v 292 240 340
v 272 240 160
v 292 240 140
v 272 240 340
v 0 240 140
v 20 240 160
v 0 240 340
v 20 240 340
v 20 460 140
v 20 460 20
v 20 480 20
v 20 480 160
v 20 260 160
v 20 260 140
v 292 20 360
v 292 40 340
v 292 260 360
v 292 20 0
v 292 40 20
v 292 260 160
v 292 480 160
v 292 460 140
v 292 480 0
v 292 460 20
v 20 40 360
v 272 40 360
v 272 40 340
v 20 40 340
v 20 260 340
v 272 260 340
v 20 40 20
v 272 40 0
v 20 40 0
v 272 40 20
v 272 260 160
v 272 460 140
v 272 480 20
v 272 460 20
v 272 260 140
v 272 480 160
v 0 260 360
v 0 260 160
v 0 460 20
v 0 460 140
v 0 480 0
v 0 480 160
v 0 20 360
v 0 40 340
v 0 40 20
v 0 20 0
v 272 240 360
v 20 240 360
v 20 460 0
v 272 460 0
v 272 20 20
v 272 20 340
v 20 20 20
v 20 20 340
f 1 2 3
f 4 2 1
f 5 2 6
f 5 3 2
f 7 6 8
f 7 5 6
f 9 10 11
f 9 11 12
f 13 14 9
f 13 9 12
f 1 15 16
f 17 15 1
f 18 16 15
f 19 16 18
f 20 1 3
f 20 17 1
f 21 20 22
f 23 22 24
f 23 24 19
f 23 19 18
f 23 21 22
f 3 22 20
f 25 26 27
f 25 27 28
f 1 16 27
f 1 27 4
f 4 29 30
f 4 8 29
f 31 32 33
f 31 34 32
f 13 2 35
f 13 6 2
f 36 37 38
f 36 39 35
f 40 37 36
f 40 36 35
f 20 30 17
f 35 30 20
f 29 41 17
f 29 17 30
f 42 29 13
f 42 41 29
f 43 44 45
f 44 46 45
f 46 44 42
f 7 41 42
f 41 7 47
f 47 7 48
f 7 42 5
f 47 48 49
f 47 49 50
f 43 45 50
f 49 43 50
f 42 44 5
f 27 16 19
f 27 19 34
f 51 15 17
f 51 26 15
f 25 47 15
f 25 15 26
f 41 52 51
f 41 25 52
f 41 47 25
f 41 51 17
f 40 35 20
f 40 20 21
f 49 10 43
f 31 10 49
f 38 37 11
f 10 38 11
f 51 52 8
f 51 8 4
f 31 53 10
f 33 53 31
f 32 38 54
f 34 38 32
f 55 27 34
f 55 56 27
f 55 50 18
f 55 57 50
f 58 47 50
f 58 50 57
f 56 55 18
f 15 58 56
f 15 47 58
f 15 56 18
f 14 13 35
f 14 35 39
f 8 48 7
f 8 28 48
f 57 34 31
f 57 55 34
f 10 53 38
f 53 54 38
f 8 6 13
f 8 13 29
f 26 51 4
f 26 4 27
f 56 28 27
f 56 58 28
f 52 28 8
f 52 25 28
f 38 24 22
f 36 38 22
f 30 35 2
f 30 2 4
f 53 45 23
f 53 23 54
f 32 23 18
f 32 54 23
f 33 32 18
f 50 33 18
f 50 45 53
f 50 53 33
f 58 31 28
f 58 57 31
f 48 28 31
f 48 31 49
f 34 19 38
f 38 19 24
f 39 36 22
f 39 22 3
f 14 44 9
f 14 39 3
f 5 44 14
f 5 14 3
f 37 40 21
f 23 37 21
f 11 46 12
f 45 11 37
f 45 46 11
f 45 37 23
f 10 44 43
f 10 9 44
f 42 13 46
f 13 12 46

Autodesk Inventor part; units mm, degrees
ref_plane "YZ Plane" through (0, 0, 0) normal (1, 0, 0) x (0, 1, 0)
ref_plane "XZ Plane" through (0, 0, 0) normal (0, 1, 0) x (-1, 0, 0)
ref_plane "XY Plane" through (0, 0, 0) normal (0, 0, 1) x (1, 0, 0)
sketch "Sketch1" plane through (0, 0, 0) normal (0, 0, 1) x (1, 0, 0)
  line L0 (0, 0) -> (220, 0)
  line L1 (220, 0) -> (220, 480)
  line L2 (220, 480) -> (0, 480)
  line L3 (0, 480) -> (0, 0)
  dimension "d0" = 480
  dimension "d1" = 220
extrude "Extrusion1" add sketch "Sketch1" along normal blind 360
sketch "Sketch2" plane through (0, 480, 0) normal (0, 1, 0) x (1, 0, 0)
  line L0 (220, 0) -> (220, -360) projected
  line L1 (0, 0) -> (220, 0)
  line L2 (220, 0) -> (220, -160)
  line L3 (220, -160) -> (0, -160)
  line L4 (0, -160) -> (0, 0)
  line L5 (20, -20) -> (200, -20)
  line L6 (200, -20) -> (200, -140)
  line L7 (200, -140) -> (20, -140)
  line L8 (20, -140) -> (20, -20)
  line L9 (0, -360) -> (220, -360) projected
  line L10 (0, -160) -> (220, -160)
  line L11 (220, -160) -> (220, -360)
  line L12 (220, -360) -> (0, -360)
  line L13 (0, -360) -> (0, -160)
  dimension "d4" = 160
  dimension "d5" = 20
  dimension "d6" = 20
  dimension "d7" = 20
  dimension "d8" = 20
extrude "Extrusion2" cut sketch "Sketch2" against normal blind 220 contours L0 L9 L13 L3
sketch "Sketch3" plane through (220, 0, 0) normal (1, 0, 0) x (0, 0, -1)
  line L0 (-20, 240) -> (-20, 20)
  line L1 (-20, 20) -> (-340, 20)
  line L2 (-340, 20) -> (-340, 240)
  line L3 (-160, 260) -> (-360, 260) projected
  line L4 (-360, 0) -> (-360, 260) projected
  line L5 (0, 0) -> (-360, 0) projected
  line L6 (0, 0) -> (0, 480) projected
  line L7 (-340, 240) -> (-140, 240)
  line L8 (-140, 240) -> (-140, 460)
  line L9 (-140, 460) -> (-20, 460)
  line L10 (-20, 460) -> (-20, 240)
  line L11 (-160, 480) -> (-160, 260) projected
  line L12 (0, 480) -> (-160, 480) projected
  dimension "d12" = 20
  dimension "d13" = 20
  dimension "d14" = 20
  dimension "d16" = 20
  dimension "d17" = 20
  dimension "d18" = 20
extrude "Extrusion3" cut sketch "Sketch3" against normal blind 220 contours L0 L1 L2 L7 L8 L9 L10
sketch "Sketch4" plane through (0, 0, 360) normal (0, 0, 1) x (1, 0, 0)
  line L0 (20, 240) -> (200, 240)
  line L1 (200, 240) -> (200, 20)
  line L2 (200, 20) -> (20, 20)
  line L3 (20, 20) -> (20, 240)
  line L4 (220, 260) -> (0, 260) projected
  line L5 (0, 260) -> (0, 0) projected
  line L6 (0, 0) -> (220, 0) projected
  line L7 (220, 0) -> (220, 260) projected
  dimension "d21" = 20
  dimension "d22" = 20
  dimension "d23" = 20
  dimension "d24" = 20
extrude "Extrusion4" cut sketch "Sketch4" against normal blind 600 contours L0 L1 L2 L3
sketch "Sketch5" plane through (0, 0, 0) normal (0, -1, 0) x (1, 0, 0)
  line L0 (200, 20) -> (200, 0) projected
  line L1 (20, 340) -> (200, 340)
  line L2 (200, 340) -> (200, 20)
  line L3 (200, 20) -> (20, 20)
  line L4 (20, 20) -> (20, 340)
  point P0 (0, 0)
extrude "Extrusion5" cut sketch "Sketch5" against normal blind 900
sketch "Sketch6" plane through (0, 0, 0) normal (0, 0, -1) x (-1, 0, 0)
  line L0 (-220, 240) -> (-200, 240) projected
  line L1 (-20, 460) -> (-20, 240) projected
  line L2 (-200, 240) -> (-20, 240)
  line L3 (-20, 240) -> (-20, 460)
  line L4 (-20, 460) -> (-200, 460)
  line L5 (-200, 460) -> (-200, 240)
  point P0 (0, 0)
extrude "Extrusion6" cut sketch "Sketch6" against normal blind 80
sketch "Sketch7" plane through (20, 260, 160) normal (1, 0, 0) x (0, 0, -1)
  line L0 (20, 200) -> (20, -20) projected
  line L1 (20, -20) -> (0, -20)
  line L2 (0, -20) -> (0, 0)
  line L3 (0, 0) -> (20, 0)
  line L4 (20, 0) -> (20, -20)
  point P0 (160, -260)
extrude "Extrusion7" add sketch "Sketch7" along normal blind 180
sketch "Sketch8" plane through (0, 0, 0) normal (0, -1, 0) x (1, 0, 0)
  point P0 (0, 0)
sketch "Sketch9" plane through (220, 0, 0) normal (1, 0, 0) x (0, 0, -1)
  line L0 (-360, 0) -> (-360, 260) projected
  line L1 (-360, 0) -> (-360, 260)
  line L2 (-360, 260) -> (-160, 260)
  line L3 (-160, 480) -> (-20, 480) projected
  line L4 (-160, 260) -> (-160, 480)
  line L5 (-160, 480) -> (0, 480)
  line L6 (0, 480) -> (0, 0)
  line L7 (0, 0) -> (-360, 0)
extrude "Extrusion8" add sketch "Sketch9" along normal blind 72
sketch "Sketch10" plane through (292, 0, 0) normal (1, 0, 0) x (0, 0, -1)
  line L0 (-340, 20) -> (-340, 240) projected
  line L1 (-340, 240) -> (-340, 20)
  line L2 (-20, 20) -> (-340, 20) projected
  line L3 (-340, 20) -> (-20, 20)
  line L4 (0, 460) -> (-20, 460) projected
  line L5 (-20, 20) -> (-20, 460)
  line L6 (-20, 460) -> (-140, 460)
  line L7 (-140, 240) -> (-340, 240) projected
  line L8 (-140, 460) -> (-140, 240)
  line L9 (-140, 240) -> (-340, 240)
  point P0 (0, 0)
extrude "Extrusion9" cut sketch "Sketch10" against normal blind 150
sketch "Sketch11" plane through (0, 0, 360) normal (0, 0, 1) x (1, 0, 0)
  line L0 (20, 240) -> (200, 240) projected
  line L1 (292, 20) -> (200, 20) projected
  line L2 (200, 240) -> (272, 240)
  line L3 (272, 240) -> (272, 20)
  line L4 (272, 20) -> (200, 20)
  line L5 (200, 20) -> (200, 240)
  line L6 (292, 260) -> (292, 0) projected
  point P0 (0, 0)
  dimension "d37" = 20
extrude "Extrusion10" cut sketch "Sketch11" against normal blind 900
sketch "Sketch12" plane through (0, 260, 0) normal (0, 1, 0) x (1, 0, 0)
  line L0 (200, -340) -> (200, -160) projected
  line L1 (200, -160) -> (272, -160)
  line L2 (272, -160) -> (272, -340)
  line L3 (272, -340) -> (200, -340)
  line L4 (200, -340) -> (200, -160)
  line L5 (292, -160) -> (292, -360) projected
  point P0 (0, 0)
  dimension "d40" = 20
extrude "Extrusion11" cut sketch "Sketch12" against normal blind 900
sketch "Sketch13" plane through (20, 260, 160) normal (0, 0, 1) x (1, 0, 0)
  line L0 (180, 200) -> (0, 200) projected
  line L1 (252, 0) -> (272, 0) projected
  line L2 (180, 200) -> (252, 200)
  line L3 (252, 200) -> (252, 0)
  line L4 (252, 0) -> (180, 0)
  line L5 (180, 0) -> (180, 200)
  point P0 (-20, -260)
extrude "Extrusion12" cut sketch "Sketch13" against normal blind 900
sketch "Sketch14" plane through (0, 480, 160) normal (0, 1, 0) x (1, 0, 0)
  line L0 (200, 140) -> (200, 0) projected
  line L1 (292, 140) -> (272, 140) projected
  line L2 (200, 0) -> (272, 0)
  line L3 (272, 0) -> (272, 140)
  line L4 (272, 140) -> (200, 140)
  line L5 (200, 140) -> (200, 0)
  point P0 (0, 160)
extrude "Extrusion13" cut sketch "Sketch14" against normal blind 900
sketch "Sketch15" plane through (200, 240, 140) normal (1, 0, 0) x (0, 0, -1)
  line L0 (-220, 20) -> (-20, 20) projected
  line L1 (0, 0) -> (-200, 0) projected
  line L2 (-20, 20) -> (0, 20)
  line L3 (0, 20) -> (0, 0)
  line L4 (0, 0) -> (-20, 0)
  line L5 (-20, 0) -> (-20, 20)
  point P0 (140, -240)
extrude "Extrusion14" add sketch "Sketch15" along normal up to next
sketch "Sketch16" plane through (200, 240, 0) normal (-1, 0, 0) x (0, 0, 1)
  line L0 (20, 20) -> (0, 20) projected
  line L1 (20, 0) -> (20, -220) projected
  line L2 (0, 20) -> (20, 20)
  line L3 (20, 20) -> (20, 0)
  line L4 (20, 0) -> (0, 0)
  line L5 (0, 0) -> (0, 20)
  point P0 (0, -240)
extrude "Extrusion15" cut sketch "Sketch16" against normal up to surface (72 mm away) from surface at 0
sketch "Sketch17" plane through (0, 0, 0) normal (0, -1, 0) x (1, 0, 0)
  line L0 (292, 360) -> (0, 360) projected
  line L1 (292, 360) -> (292, 0) projected
  line L2 (0, 360) -> (292, 360)
  line L3 (292, 360) -> (292, 0)
  line L4 (292, 0) -> (0, 0)
  line L5 (0, 0) -> (0, 360)
  point P0 (0, 0)
extrude "Extrusion16" cut sketch "Sketch17" against normal blind 20
sketch "Sketch18" plane through (0, 0, 360) normal (0, 0, 1) x (1, 0, 0)
  line L0 (0, 20) -> (292, 20)
  line L1 (292, 20) -> (292, 40)
  line L2 (292, 40) -> (0, 40)
  line L3 (0, 40) -> (0, 20)
  point P0 (0, 0)
  dimension "d53" = 20
extrude "Extrusion17" add sketch "Sketch18" against normal blind 360
sketch "Sketch19" plane through (0, 20, 0) normal (0, -1, 0) x (1, 0, 0)
  line L0 (20, 360) -> (20, 340) projected
  line L1 (20, 340) -> (272, 340)
  line L2 (272, 340) -> (272, 20)
  line L3 (272, 20) -> (20, 20)
  line L4 (20, 20) -> (20, 340)
  point P0 (0, 0)
extrude "Extrusion18" cut sketch "Sketch19" against normal blind 60
properties part number "fuel tank housing"
